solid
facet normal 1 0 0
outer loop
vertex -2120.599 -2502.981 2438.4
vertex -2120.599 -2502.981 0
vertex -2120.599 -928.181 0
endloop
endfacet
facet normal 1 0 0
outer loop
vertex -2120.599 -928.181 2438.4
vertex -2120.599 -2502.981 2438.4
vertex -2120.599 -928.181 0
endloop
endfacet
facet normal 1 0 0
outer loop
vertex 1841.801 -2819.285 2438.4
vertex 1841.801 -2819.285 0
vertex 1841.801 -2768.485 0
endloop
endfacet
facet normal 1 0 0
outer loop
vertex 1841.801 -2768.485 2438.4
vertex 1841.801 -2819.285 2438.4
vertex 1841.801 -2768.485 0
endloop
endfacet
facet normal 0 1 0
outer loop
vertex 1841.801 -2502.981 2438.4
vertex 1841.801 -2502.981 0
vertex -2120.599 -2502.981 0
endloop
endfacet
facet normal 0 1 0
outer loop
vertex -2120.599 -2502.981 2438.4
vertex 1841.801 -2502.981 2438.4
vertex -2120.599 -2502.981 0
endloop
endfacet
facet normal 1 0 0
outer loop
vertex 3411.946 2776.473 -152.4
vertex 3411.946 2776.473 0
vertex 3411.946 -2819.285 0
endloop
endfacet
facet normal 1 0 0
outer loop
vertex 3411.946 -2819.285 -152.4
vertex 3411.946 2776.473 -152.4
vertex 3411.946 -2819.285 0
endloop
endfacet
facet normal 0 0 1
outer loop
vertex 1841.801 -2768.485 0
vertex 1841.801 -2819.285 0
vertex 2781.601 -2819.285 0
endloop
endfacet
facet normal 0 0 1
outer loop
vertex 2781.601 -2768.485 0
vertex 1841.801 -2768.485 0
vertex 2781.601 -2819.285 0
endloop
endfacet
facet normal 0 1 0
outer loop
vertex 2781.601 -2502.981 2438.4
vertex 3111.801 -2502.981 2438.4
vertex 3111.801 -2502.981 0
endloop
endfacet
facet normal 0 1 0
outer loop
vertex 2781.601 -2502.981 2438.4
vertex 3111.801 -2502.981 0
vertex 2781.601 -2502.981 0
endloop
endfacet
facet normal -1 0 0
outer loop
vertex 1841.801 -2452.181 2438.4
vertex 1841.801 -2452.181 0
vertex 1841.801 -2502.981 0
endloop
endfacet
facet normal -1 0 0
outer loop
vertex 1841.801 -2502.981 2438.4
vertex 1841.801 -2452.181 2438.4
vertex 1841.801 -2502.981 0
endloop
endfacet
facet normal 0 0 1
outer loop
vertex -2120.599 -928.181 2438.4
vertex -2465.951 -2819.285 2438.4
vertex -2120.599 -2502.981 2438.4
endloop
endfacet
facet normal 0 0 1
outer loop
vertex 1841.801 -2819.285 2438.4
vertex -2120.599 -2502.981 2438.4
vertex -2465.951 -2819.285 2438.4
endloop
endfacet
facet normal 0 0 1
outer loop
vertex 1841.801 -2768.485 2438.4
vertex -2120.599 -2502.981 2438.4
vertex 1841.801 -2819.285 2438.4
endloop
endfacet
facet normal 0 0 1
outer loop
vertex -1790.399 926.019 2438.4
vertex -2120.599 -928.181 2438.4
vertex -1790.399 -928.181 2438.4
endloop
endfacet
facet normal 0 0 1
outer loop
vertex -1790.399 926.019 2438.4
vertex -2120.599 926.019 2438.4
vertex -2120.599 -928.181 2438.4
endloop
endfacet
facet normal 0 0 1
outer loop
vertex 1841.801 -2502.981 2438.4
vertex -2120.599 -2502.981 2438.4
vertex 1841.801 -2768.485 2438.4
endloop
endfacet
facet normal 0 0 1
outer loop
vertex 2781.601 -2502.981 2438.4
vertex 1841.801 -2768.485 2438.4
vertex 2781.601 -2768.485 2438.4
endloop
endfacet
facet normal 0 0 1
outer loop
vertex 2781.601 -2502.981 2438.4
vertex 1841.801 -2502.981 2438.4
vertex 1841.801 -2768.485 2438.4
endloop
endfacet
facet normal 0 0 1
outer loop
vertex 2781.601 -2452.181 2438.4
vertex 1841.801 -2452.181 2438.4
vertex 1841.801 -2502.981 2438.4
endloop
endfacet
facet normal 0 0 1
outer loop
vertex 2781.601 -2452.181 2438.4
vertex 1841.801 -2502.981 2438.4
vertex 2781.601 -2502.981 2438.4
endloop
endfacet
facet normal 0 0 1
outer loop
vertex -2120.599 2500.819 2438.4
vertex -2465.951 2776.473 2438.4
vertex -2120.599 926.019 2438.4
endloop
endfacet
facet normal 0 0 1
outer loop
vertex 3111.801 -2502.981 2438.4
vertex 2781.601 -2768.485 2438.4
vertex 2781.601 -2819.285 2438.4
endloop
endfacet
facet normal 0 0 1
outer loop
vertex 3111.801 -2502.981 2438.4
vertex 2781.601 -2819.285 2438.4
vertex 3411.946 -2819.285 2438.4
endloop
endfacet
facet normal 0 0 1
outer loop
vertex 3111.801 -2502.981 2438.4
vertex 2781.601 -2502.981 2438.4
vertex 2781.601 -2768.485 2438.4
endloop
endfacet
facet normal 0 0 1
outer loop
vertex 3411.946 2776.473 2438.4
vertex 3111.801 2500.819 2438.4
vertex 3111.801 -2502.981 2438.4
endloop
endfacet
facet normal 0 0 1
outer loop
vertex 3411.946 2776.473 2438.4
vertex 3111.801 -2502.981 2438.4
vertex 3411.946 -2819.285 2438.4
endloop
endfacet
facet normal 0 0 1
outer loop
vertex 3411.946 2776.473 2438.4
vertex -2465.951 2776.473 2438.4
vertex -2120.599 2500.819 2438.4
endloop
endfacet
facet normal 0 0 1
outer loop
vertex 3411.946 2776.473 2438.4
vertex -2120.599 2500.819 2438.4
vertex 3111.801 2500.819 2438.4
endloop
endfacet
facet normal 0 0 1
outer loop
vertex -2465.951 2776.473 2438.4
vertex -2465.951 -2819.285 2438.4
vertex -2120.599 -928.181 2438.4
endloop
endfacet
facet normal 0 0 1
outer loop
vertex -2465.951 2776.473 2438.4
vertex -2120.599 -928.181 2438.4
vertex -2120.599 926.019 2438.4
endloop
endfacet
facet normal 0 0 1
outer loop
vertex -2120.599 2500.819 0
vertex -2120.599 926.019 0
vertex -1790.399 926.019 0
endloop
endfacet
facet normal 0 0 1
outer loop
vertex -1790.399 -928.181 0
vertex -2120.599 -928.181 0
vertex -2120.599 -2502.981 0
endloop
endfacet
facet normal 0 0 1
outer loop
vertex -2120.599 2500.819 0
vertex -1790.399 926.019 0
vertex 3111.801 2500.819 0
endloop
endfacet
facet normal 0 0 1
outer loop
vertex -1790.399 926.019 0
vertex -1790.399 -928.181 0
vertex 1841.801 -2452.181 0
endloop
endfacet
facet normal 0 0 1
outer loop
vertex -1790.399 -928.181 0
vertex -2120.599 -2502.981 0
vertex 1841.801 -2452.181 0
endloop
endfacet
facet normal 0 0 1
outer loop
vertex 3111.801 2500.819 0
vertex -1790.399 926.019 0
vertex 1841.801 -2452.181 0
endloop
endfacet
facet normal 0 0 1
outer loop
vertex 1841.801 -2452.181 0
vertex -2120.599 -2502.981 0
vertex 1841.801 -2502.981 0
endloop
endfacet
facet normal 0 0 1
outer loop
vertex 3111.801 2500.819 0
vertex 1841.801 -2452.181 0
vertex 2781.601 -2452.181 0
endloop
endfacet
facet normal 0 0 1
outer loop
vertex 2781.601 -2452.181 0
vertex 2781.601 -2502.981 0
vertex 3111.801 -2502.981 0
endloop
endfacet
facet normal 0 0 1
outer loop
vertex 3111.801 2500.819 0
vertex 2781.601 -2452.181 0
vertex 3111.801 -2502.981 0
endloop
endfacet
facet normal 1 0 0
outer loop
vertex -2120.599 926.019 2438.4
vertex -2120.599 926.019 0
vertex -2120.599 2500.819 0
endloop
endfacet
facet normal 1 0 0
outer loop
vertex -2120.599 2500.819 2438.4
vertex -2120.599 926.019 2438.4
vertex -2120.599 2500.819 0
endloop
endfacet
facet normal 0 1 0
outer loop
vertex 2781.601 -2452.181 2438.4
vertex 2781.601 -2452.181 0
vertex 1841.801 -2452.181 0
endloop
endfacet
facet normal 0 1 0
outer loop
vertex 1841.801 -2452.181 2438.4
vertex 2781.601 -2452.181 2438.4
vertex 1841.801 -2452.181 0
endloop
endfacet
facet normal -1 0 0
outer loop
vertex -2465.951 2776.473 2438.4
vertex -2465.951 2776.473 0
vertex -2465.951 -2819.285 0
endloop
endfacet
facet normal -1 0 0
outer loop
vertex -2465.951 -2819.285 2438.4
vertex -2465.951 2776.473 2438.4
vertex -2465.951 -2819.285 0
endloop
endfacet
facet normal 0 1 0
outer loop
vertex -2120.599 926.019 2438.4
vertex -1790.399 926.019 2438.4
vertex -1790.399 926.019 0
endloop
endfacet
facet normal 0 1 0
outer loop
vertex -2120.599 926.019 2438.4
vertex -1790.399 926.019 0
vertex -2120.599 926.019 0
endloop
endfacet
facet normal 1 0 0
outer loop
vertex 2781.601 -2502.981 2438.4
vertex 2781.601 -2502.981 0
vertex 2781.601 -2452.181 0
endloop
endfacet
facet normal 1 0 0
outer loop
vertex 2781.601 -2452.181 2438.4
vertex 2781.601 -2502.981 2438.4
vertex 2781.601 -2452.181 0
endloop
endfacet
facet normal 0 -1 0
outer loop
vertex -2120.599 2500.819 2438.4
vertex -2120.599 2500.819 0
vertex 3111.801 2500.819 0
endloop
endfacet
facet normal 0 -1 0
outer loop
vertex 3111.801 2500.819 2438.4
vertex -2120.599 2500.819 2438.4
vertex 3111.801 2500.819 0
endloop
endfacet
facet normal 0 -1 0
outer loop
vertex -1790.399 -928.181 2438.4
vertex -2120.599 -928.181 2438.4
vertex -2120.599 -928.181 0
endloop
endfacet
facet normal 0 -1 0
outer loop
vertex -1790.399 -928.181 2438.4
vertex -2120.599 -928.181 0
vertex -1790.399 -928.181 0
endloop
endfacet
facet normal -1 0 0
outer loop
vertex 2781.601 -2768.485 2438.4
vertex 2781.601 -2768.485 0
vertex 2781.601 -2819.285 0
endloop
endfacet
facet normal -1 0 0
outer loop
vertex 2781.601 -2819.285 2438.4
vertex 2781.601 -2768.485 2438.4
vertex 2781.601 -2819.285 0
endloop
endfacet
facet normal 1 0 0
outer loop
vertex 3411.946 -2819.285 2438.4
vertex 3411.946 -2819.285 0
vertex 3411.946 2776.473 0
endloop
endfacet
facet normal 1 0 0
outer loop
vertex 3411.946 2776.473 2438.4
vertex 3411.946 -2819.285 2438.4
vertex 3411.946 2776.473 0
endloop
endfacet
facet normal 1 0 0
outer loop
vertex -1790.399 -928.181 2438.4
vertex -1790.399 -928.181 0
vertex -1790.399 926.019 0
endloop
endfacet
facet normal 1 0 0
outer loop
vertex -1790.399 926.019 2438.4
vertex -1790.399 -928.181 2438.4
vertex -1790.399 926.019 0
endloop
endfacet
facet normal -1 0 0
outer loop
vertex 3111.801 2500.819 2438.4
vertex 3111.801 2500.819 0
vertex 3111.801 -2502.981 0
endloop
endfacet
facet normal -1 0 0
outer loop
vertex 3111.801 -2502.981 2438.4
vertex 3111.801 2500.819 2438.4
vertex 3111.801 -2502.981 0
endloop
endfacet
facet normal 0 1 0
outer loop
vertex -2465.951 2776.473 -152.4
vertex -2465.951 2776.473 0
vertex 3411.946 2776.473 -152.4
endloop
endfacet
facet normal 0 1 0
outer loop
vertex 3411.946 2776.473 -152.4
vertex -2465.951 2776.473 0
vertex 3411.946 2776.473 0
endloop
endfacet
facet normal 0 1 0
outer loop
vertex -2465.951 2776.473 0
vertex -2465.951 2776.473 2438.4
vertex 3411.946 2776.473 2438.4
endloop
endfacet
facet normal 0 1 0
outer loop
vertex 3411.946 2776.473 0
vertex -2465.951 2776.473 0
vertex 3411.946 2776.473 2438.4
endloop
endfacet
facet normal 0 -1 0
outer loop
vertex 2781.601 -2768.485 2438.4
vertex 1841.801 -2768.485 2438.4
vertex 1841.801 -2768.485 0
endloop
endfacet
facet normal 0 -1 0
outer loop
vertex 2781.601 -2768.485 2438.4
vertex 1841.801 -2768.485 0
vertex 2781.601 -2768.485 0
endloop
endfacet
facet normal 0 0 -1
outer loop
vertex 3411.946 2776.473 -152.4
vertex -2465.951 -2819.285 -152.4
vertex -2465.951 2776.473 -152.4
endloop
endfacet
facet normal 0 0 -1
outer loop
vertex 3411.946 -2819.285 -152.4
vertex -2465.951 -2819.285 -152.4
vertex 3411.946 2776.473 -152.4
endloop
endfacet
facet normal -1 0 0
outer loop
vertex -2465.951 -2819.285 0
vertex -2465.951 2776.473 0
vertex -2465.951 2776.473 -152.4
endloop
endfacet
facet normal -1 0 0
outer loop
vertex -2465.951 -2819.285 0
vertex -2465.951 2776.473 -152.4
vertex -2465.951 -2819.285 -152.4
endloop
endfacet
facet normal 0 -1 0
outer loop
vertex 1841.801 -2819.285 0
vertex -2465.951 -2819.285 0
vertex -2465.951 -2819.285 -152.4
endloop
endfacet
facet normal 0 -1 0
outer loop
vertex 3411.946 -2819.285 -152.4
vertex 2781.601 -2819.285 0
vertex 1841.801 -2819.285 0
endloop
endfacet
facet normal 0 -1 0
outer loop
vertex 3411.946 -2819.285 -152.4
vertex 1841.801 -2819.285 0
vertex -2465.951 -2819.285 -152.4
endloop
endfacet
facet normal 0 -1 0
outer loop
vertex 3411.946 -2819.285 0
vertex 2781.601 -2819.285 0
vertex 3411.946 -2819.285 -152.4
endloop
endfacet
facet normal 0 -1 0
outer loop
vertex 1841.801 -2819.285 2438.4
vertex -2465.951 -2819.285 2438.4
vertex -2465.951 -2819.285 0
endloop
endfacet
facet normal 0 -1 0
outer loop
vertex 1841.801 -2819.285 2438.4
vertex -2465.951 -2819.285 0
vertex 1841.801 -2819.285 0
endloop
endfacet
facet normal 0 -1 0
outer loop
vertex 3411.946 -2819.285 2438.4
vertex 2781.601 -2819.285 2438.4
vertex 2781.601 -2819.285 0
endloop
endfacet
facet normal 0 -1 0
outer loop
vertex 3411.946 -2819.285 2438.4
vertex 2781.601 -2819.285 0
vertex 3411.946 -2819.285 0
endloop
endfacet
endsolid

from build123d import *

# Parameters (mm, degrees)
F1_DEPTH = 2438.4
F2_W     = 5877.897263
F2_H     = 5595.7582
F3_DEPTH = 152.4


with BuildPart() as f1:
    # F0 (on Top) → F1 (new body)
    with BuildSketch(Plane.XY):
        Polygon((3411.946297, 2776.472807), (-2465.950966, 2776.472807), (-2465.950966, -2819.285393), (1841.801322, -2819.285393), (1841.801322, -2768.485393), (2781.601322, -2768.485393), (2781.601322, -2819.285393), (3411.946297, -2819.285393), align=None)
        Polygon((-2120.598678, 926.018782), (-2120.598678, 2500.818782), (3111.801322, 2500.818782), (3111.801322, -2502.981218), (2781.601322, -2502.981218), (2781.601322, -2452.181218), (1841.801322, -2452.181218), (1841.801322, -2502.981218), (-2120.598678, -2502.981218), (-2120.598678, -928.181218), (-1790.398678, -928.181218), (-1790.398678, 926.018782), align=None, mode=Mode.SUBTRACT)
    extrude(amount=F1_DEPTH)

    # F2 (on face) → F3 (join)
    with BuildSketch(Plane(origin=(0, 0, 0), x_dir=(1, 0, 0), z_dir=(0, 0, -1))):
        with Locations((472.997666, 21.406293)):
            Rectangle(F2_W, F2_H)
    extrude(amount=F3_DEPTH)


solid = f1.part
